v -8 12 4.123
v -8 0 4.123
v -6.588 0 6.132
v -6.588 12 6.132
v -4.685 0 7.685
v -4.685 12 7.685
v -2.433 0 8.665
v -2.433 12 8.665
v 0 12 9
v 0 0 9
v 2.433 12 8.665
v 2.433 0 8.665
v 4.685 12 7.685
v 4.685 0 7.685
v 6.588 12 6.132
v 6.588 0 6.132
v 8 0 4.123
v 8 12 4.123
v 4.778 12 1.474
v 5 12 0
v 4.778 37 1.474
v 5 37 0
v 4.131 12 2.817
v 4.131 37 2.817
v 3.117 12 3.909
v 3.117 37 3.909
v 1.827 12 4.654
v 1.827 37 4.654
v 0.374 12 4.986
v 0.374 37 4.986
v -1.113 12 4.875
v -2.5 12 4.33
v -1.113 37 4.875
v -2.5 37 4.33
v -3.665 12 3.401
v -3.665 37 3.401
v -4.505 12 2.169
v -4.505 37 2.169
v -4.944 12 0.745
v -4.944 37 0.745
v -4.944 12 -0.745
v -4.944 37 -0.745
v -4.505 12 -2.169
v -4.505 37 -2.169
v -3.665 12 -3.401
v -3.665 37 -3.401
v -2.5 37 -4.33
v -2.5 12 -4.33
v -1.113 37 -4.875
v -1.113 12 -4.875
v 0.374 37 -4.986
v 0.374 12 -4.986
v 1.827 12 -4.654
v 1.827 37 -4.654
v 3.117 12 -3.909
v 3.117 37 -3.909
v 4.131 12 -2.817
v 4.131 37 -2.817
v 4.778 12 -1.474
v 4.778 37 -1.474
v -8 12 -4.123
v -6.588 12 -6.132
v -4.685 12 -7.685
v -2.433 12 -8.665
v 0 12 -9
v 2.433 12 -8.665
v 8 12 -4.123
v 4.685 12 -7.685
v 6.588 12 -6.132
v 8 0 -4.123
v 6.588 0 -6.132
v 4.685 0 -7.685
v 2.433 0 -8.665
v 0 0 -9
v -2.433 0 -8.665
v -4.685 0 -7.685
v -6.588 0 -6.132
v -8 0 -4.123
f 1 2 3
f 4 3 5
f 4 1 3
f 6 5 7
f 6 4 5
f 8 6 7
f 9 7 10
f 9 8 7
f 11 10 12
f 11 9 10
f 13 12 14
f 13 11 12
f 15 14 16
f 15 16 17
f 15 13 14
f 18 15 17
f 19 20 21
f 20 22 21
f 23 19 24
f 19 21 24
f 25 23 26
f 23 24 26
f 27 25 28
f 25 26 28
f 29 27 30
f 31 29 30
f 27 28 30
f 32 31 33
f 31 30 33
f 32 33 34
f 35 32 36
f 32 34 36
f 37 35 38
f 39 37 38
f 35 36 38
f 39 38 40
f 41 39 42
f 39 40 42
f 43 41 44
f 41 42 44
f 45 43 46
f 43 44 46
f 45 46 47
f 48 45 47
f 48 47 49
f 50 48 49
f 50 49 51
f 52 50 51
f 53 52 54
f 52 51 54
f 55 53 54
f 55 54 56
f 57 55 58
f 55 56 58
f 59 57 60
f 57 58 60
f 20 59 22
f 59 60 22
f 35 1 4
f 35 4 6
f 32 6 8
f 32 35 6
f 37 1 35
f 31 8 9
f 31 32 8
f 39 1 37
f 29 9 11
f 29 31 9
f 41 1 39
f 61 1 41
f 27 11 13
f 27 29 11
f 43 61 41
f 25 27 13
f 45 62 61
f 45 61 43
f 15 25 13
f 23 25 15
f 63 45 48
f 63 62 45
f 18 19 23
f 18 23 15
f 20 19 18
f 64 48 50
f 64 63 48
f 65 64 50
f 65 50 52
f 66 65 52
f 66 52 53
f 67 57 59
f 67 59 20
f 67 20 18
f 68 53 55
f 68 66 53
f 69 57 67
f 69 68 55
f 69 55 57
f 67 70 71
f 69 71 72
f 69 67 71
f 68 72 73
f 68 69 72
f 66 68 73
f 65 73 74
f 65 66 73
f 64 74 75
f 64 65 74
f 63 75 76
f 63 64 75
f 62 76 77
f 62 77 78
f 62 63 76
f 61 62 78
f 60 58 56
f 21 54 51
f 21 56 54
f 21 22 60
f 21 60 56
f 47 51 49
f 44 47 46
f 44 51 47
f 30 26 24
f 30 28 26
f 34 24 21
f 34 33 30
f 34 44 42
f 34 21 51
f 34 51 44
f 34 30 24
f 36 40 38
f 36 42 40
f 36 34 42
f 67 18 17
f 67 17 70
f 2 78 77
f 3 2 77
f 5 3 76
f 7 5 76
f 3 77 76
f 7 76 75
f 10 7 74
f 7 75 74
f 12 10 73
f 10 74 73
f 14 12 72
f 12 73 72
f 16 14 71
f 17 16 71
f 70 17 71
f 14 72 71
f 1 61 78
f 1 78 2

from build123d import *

# Parameters (mm, degrees)
EXTRUDE_1_DEPTH = 12
SKETCH_2_W      = 5
SKETCH_2_H      = 25


with BuildPart() as part:
    # 草图1 → 凸台-拉伸1 (new body)
    with BuildSketch(Plane(origin=(0, 12, 0), x_dir=(1, 0, 0), z_dir=(0, 1, 0))):
        with BuildLine():
            Line((-8, 4.123105626), (-8, -4.123105626))
            ThreePointArc((-8, -4.123105626), (0, -9), (8, -4.123105626))
            Line((8, -4.123105626), (8, 4.123105626))
            ThreePointArc((8, 4.123105626), (0, 9), (-8, 4.123105626))
        make_face()
    extrude(amount=-EXTRUDE_1_DEPTH)

    # 草图2 → 旋转1 (revolve)
    with BuildSketch(Plane.XY):
        with Locations((2.5, 24.5)):
            Rectangle(SKETCH_2_W, SKETCH_2_H)
    revolve(axis=Axis((0, 37, 0), (0, -1, 0)))


solid = part.part
